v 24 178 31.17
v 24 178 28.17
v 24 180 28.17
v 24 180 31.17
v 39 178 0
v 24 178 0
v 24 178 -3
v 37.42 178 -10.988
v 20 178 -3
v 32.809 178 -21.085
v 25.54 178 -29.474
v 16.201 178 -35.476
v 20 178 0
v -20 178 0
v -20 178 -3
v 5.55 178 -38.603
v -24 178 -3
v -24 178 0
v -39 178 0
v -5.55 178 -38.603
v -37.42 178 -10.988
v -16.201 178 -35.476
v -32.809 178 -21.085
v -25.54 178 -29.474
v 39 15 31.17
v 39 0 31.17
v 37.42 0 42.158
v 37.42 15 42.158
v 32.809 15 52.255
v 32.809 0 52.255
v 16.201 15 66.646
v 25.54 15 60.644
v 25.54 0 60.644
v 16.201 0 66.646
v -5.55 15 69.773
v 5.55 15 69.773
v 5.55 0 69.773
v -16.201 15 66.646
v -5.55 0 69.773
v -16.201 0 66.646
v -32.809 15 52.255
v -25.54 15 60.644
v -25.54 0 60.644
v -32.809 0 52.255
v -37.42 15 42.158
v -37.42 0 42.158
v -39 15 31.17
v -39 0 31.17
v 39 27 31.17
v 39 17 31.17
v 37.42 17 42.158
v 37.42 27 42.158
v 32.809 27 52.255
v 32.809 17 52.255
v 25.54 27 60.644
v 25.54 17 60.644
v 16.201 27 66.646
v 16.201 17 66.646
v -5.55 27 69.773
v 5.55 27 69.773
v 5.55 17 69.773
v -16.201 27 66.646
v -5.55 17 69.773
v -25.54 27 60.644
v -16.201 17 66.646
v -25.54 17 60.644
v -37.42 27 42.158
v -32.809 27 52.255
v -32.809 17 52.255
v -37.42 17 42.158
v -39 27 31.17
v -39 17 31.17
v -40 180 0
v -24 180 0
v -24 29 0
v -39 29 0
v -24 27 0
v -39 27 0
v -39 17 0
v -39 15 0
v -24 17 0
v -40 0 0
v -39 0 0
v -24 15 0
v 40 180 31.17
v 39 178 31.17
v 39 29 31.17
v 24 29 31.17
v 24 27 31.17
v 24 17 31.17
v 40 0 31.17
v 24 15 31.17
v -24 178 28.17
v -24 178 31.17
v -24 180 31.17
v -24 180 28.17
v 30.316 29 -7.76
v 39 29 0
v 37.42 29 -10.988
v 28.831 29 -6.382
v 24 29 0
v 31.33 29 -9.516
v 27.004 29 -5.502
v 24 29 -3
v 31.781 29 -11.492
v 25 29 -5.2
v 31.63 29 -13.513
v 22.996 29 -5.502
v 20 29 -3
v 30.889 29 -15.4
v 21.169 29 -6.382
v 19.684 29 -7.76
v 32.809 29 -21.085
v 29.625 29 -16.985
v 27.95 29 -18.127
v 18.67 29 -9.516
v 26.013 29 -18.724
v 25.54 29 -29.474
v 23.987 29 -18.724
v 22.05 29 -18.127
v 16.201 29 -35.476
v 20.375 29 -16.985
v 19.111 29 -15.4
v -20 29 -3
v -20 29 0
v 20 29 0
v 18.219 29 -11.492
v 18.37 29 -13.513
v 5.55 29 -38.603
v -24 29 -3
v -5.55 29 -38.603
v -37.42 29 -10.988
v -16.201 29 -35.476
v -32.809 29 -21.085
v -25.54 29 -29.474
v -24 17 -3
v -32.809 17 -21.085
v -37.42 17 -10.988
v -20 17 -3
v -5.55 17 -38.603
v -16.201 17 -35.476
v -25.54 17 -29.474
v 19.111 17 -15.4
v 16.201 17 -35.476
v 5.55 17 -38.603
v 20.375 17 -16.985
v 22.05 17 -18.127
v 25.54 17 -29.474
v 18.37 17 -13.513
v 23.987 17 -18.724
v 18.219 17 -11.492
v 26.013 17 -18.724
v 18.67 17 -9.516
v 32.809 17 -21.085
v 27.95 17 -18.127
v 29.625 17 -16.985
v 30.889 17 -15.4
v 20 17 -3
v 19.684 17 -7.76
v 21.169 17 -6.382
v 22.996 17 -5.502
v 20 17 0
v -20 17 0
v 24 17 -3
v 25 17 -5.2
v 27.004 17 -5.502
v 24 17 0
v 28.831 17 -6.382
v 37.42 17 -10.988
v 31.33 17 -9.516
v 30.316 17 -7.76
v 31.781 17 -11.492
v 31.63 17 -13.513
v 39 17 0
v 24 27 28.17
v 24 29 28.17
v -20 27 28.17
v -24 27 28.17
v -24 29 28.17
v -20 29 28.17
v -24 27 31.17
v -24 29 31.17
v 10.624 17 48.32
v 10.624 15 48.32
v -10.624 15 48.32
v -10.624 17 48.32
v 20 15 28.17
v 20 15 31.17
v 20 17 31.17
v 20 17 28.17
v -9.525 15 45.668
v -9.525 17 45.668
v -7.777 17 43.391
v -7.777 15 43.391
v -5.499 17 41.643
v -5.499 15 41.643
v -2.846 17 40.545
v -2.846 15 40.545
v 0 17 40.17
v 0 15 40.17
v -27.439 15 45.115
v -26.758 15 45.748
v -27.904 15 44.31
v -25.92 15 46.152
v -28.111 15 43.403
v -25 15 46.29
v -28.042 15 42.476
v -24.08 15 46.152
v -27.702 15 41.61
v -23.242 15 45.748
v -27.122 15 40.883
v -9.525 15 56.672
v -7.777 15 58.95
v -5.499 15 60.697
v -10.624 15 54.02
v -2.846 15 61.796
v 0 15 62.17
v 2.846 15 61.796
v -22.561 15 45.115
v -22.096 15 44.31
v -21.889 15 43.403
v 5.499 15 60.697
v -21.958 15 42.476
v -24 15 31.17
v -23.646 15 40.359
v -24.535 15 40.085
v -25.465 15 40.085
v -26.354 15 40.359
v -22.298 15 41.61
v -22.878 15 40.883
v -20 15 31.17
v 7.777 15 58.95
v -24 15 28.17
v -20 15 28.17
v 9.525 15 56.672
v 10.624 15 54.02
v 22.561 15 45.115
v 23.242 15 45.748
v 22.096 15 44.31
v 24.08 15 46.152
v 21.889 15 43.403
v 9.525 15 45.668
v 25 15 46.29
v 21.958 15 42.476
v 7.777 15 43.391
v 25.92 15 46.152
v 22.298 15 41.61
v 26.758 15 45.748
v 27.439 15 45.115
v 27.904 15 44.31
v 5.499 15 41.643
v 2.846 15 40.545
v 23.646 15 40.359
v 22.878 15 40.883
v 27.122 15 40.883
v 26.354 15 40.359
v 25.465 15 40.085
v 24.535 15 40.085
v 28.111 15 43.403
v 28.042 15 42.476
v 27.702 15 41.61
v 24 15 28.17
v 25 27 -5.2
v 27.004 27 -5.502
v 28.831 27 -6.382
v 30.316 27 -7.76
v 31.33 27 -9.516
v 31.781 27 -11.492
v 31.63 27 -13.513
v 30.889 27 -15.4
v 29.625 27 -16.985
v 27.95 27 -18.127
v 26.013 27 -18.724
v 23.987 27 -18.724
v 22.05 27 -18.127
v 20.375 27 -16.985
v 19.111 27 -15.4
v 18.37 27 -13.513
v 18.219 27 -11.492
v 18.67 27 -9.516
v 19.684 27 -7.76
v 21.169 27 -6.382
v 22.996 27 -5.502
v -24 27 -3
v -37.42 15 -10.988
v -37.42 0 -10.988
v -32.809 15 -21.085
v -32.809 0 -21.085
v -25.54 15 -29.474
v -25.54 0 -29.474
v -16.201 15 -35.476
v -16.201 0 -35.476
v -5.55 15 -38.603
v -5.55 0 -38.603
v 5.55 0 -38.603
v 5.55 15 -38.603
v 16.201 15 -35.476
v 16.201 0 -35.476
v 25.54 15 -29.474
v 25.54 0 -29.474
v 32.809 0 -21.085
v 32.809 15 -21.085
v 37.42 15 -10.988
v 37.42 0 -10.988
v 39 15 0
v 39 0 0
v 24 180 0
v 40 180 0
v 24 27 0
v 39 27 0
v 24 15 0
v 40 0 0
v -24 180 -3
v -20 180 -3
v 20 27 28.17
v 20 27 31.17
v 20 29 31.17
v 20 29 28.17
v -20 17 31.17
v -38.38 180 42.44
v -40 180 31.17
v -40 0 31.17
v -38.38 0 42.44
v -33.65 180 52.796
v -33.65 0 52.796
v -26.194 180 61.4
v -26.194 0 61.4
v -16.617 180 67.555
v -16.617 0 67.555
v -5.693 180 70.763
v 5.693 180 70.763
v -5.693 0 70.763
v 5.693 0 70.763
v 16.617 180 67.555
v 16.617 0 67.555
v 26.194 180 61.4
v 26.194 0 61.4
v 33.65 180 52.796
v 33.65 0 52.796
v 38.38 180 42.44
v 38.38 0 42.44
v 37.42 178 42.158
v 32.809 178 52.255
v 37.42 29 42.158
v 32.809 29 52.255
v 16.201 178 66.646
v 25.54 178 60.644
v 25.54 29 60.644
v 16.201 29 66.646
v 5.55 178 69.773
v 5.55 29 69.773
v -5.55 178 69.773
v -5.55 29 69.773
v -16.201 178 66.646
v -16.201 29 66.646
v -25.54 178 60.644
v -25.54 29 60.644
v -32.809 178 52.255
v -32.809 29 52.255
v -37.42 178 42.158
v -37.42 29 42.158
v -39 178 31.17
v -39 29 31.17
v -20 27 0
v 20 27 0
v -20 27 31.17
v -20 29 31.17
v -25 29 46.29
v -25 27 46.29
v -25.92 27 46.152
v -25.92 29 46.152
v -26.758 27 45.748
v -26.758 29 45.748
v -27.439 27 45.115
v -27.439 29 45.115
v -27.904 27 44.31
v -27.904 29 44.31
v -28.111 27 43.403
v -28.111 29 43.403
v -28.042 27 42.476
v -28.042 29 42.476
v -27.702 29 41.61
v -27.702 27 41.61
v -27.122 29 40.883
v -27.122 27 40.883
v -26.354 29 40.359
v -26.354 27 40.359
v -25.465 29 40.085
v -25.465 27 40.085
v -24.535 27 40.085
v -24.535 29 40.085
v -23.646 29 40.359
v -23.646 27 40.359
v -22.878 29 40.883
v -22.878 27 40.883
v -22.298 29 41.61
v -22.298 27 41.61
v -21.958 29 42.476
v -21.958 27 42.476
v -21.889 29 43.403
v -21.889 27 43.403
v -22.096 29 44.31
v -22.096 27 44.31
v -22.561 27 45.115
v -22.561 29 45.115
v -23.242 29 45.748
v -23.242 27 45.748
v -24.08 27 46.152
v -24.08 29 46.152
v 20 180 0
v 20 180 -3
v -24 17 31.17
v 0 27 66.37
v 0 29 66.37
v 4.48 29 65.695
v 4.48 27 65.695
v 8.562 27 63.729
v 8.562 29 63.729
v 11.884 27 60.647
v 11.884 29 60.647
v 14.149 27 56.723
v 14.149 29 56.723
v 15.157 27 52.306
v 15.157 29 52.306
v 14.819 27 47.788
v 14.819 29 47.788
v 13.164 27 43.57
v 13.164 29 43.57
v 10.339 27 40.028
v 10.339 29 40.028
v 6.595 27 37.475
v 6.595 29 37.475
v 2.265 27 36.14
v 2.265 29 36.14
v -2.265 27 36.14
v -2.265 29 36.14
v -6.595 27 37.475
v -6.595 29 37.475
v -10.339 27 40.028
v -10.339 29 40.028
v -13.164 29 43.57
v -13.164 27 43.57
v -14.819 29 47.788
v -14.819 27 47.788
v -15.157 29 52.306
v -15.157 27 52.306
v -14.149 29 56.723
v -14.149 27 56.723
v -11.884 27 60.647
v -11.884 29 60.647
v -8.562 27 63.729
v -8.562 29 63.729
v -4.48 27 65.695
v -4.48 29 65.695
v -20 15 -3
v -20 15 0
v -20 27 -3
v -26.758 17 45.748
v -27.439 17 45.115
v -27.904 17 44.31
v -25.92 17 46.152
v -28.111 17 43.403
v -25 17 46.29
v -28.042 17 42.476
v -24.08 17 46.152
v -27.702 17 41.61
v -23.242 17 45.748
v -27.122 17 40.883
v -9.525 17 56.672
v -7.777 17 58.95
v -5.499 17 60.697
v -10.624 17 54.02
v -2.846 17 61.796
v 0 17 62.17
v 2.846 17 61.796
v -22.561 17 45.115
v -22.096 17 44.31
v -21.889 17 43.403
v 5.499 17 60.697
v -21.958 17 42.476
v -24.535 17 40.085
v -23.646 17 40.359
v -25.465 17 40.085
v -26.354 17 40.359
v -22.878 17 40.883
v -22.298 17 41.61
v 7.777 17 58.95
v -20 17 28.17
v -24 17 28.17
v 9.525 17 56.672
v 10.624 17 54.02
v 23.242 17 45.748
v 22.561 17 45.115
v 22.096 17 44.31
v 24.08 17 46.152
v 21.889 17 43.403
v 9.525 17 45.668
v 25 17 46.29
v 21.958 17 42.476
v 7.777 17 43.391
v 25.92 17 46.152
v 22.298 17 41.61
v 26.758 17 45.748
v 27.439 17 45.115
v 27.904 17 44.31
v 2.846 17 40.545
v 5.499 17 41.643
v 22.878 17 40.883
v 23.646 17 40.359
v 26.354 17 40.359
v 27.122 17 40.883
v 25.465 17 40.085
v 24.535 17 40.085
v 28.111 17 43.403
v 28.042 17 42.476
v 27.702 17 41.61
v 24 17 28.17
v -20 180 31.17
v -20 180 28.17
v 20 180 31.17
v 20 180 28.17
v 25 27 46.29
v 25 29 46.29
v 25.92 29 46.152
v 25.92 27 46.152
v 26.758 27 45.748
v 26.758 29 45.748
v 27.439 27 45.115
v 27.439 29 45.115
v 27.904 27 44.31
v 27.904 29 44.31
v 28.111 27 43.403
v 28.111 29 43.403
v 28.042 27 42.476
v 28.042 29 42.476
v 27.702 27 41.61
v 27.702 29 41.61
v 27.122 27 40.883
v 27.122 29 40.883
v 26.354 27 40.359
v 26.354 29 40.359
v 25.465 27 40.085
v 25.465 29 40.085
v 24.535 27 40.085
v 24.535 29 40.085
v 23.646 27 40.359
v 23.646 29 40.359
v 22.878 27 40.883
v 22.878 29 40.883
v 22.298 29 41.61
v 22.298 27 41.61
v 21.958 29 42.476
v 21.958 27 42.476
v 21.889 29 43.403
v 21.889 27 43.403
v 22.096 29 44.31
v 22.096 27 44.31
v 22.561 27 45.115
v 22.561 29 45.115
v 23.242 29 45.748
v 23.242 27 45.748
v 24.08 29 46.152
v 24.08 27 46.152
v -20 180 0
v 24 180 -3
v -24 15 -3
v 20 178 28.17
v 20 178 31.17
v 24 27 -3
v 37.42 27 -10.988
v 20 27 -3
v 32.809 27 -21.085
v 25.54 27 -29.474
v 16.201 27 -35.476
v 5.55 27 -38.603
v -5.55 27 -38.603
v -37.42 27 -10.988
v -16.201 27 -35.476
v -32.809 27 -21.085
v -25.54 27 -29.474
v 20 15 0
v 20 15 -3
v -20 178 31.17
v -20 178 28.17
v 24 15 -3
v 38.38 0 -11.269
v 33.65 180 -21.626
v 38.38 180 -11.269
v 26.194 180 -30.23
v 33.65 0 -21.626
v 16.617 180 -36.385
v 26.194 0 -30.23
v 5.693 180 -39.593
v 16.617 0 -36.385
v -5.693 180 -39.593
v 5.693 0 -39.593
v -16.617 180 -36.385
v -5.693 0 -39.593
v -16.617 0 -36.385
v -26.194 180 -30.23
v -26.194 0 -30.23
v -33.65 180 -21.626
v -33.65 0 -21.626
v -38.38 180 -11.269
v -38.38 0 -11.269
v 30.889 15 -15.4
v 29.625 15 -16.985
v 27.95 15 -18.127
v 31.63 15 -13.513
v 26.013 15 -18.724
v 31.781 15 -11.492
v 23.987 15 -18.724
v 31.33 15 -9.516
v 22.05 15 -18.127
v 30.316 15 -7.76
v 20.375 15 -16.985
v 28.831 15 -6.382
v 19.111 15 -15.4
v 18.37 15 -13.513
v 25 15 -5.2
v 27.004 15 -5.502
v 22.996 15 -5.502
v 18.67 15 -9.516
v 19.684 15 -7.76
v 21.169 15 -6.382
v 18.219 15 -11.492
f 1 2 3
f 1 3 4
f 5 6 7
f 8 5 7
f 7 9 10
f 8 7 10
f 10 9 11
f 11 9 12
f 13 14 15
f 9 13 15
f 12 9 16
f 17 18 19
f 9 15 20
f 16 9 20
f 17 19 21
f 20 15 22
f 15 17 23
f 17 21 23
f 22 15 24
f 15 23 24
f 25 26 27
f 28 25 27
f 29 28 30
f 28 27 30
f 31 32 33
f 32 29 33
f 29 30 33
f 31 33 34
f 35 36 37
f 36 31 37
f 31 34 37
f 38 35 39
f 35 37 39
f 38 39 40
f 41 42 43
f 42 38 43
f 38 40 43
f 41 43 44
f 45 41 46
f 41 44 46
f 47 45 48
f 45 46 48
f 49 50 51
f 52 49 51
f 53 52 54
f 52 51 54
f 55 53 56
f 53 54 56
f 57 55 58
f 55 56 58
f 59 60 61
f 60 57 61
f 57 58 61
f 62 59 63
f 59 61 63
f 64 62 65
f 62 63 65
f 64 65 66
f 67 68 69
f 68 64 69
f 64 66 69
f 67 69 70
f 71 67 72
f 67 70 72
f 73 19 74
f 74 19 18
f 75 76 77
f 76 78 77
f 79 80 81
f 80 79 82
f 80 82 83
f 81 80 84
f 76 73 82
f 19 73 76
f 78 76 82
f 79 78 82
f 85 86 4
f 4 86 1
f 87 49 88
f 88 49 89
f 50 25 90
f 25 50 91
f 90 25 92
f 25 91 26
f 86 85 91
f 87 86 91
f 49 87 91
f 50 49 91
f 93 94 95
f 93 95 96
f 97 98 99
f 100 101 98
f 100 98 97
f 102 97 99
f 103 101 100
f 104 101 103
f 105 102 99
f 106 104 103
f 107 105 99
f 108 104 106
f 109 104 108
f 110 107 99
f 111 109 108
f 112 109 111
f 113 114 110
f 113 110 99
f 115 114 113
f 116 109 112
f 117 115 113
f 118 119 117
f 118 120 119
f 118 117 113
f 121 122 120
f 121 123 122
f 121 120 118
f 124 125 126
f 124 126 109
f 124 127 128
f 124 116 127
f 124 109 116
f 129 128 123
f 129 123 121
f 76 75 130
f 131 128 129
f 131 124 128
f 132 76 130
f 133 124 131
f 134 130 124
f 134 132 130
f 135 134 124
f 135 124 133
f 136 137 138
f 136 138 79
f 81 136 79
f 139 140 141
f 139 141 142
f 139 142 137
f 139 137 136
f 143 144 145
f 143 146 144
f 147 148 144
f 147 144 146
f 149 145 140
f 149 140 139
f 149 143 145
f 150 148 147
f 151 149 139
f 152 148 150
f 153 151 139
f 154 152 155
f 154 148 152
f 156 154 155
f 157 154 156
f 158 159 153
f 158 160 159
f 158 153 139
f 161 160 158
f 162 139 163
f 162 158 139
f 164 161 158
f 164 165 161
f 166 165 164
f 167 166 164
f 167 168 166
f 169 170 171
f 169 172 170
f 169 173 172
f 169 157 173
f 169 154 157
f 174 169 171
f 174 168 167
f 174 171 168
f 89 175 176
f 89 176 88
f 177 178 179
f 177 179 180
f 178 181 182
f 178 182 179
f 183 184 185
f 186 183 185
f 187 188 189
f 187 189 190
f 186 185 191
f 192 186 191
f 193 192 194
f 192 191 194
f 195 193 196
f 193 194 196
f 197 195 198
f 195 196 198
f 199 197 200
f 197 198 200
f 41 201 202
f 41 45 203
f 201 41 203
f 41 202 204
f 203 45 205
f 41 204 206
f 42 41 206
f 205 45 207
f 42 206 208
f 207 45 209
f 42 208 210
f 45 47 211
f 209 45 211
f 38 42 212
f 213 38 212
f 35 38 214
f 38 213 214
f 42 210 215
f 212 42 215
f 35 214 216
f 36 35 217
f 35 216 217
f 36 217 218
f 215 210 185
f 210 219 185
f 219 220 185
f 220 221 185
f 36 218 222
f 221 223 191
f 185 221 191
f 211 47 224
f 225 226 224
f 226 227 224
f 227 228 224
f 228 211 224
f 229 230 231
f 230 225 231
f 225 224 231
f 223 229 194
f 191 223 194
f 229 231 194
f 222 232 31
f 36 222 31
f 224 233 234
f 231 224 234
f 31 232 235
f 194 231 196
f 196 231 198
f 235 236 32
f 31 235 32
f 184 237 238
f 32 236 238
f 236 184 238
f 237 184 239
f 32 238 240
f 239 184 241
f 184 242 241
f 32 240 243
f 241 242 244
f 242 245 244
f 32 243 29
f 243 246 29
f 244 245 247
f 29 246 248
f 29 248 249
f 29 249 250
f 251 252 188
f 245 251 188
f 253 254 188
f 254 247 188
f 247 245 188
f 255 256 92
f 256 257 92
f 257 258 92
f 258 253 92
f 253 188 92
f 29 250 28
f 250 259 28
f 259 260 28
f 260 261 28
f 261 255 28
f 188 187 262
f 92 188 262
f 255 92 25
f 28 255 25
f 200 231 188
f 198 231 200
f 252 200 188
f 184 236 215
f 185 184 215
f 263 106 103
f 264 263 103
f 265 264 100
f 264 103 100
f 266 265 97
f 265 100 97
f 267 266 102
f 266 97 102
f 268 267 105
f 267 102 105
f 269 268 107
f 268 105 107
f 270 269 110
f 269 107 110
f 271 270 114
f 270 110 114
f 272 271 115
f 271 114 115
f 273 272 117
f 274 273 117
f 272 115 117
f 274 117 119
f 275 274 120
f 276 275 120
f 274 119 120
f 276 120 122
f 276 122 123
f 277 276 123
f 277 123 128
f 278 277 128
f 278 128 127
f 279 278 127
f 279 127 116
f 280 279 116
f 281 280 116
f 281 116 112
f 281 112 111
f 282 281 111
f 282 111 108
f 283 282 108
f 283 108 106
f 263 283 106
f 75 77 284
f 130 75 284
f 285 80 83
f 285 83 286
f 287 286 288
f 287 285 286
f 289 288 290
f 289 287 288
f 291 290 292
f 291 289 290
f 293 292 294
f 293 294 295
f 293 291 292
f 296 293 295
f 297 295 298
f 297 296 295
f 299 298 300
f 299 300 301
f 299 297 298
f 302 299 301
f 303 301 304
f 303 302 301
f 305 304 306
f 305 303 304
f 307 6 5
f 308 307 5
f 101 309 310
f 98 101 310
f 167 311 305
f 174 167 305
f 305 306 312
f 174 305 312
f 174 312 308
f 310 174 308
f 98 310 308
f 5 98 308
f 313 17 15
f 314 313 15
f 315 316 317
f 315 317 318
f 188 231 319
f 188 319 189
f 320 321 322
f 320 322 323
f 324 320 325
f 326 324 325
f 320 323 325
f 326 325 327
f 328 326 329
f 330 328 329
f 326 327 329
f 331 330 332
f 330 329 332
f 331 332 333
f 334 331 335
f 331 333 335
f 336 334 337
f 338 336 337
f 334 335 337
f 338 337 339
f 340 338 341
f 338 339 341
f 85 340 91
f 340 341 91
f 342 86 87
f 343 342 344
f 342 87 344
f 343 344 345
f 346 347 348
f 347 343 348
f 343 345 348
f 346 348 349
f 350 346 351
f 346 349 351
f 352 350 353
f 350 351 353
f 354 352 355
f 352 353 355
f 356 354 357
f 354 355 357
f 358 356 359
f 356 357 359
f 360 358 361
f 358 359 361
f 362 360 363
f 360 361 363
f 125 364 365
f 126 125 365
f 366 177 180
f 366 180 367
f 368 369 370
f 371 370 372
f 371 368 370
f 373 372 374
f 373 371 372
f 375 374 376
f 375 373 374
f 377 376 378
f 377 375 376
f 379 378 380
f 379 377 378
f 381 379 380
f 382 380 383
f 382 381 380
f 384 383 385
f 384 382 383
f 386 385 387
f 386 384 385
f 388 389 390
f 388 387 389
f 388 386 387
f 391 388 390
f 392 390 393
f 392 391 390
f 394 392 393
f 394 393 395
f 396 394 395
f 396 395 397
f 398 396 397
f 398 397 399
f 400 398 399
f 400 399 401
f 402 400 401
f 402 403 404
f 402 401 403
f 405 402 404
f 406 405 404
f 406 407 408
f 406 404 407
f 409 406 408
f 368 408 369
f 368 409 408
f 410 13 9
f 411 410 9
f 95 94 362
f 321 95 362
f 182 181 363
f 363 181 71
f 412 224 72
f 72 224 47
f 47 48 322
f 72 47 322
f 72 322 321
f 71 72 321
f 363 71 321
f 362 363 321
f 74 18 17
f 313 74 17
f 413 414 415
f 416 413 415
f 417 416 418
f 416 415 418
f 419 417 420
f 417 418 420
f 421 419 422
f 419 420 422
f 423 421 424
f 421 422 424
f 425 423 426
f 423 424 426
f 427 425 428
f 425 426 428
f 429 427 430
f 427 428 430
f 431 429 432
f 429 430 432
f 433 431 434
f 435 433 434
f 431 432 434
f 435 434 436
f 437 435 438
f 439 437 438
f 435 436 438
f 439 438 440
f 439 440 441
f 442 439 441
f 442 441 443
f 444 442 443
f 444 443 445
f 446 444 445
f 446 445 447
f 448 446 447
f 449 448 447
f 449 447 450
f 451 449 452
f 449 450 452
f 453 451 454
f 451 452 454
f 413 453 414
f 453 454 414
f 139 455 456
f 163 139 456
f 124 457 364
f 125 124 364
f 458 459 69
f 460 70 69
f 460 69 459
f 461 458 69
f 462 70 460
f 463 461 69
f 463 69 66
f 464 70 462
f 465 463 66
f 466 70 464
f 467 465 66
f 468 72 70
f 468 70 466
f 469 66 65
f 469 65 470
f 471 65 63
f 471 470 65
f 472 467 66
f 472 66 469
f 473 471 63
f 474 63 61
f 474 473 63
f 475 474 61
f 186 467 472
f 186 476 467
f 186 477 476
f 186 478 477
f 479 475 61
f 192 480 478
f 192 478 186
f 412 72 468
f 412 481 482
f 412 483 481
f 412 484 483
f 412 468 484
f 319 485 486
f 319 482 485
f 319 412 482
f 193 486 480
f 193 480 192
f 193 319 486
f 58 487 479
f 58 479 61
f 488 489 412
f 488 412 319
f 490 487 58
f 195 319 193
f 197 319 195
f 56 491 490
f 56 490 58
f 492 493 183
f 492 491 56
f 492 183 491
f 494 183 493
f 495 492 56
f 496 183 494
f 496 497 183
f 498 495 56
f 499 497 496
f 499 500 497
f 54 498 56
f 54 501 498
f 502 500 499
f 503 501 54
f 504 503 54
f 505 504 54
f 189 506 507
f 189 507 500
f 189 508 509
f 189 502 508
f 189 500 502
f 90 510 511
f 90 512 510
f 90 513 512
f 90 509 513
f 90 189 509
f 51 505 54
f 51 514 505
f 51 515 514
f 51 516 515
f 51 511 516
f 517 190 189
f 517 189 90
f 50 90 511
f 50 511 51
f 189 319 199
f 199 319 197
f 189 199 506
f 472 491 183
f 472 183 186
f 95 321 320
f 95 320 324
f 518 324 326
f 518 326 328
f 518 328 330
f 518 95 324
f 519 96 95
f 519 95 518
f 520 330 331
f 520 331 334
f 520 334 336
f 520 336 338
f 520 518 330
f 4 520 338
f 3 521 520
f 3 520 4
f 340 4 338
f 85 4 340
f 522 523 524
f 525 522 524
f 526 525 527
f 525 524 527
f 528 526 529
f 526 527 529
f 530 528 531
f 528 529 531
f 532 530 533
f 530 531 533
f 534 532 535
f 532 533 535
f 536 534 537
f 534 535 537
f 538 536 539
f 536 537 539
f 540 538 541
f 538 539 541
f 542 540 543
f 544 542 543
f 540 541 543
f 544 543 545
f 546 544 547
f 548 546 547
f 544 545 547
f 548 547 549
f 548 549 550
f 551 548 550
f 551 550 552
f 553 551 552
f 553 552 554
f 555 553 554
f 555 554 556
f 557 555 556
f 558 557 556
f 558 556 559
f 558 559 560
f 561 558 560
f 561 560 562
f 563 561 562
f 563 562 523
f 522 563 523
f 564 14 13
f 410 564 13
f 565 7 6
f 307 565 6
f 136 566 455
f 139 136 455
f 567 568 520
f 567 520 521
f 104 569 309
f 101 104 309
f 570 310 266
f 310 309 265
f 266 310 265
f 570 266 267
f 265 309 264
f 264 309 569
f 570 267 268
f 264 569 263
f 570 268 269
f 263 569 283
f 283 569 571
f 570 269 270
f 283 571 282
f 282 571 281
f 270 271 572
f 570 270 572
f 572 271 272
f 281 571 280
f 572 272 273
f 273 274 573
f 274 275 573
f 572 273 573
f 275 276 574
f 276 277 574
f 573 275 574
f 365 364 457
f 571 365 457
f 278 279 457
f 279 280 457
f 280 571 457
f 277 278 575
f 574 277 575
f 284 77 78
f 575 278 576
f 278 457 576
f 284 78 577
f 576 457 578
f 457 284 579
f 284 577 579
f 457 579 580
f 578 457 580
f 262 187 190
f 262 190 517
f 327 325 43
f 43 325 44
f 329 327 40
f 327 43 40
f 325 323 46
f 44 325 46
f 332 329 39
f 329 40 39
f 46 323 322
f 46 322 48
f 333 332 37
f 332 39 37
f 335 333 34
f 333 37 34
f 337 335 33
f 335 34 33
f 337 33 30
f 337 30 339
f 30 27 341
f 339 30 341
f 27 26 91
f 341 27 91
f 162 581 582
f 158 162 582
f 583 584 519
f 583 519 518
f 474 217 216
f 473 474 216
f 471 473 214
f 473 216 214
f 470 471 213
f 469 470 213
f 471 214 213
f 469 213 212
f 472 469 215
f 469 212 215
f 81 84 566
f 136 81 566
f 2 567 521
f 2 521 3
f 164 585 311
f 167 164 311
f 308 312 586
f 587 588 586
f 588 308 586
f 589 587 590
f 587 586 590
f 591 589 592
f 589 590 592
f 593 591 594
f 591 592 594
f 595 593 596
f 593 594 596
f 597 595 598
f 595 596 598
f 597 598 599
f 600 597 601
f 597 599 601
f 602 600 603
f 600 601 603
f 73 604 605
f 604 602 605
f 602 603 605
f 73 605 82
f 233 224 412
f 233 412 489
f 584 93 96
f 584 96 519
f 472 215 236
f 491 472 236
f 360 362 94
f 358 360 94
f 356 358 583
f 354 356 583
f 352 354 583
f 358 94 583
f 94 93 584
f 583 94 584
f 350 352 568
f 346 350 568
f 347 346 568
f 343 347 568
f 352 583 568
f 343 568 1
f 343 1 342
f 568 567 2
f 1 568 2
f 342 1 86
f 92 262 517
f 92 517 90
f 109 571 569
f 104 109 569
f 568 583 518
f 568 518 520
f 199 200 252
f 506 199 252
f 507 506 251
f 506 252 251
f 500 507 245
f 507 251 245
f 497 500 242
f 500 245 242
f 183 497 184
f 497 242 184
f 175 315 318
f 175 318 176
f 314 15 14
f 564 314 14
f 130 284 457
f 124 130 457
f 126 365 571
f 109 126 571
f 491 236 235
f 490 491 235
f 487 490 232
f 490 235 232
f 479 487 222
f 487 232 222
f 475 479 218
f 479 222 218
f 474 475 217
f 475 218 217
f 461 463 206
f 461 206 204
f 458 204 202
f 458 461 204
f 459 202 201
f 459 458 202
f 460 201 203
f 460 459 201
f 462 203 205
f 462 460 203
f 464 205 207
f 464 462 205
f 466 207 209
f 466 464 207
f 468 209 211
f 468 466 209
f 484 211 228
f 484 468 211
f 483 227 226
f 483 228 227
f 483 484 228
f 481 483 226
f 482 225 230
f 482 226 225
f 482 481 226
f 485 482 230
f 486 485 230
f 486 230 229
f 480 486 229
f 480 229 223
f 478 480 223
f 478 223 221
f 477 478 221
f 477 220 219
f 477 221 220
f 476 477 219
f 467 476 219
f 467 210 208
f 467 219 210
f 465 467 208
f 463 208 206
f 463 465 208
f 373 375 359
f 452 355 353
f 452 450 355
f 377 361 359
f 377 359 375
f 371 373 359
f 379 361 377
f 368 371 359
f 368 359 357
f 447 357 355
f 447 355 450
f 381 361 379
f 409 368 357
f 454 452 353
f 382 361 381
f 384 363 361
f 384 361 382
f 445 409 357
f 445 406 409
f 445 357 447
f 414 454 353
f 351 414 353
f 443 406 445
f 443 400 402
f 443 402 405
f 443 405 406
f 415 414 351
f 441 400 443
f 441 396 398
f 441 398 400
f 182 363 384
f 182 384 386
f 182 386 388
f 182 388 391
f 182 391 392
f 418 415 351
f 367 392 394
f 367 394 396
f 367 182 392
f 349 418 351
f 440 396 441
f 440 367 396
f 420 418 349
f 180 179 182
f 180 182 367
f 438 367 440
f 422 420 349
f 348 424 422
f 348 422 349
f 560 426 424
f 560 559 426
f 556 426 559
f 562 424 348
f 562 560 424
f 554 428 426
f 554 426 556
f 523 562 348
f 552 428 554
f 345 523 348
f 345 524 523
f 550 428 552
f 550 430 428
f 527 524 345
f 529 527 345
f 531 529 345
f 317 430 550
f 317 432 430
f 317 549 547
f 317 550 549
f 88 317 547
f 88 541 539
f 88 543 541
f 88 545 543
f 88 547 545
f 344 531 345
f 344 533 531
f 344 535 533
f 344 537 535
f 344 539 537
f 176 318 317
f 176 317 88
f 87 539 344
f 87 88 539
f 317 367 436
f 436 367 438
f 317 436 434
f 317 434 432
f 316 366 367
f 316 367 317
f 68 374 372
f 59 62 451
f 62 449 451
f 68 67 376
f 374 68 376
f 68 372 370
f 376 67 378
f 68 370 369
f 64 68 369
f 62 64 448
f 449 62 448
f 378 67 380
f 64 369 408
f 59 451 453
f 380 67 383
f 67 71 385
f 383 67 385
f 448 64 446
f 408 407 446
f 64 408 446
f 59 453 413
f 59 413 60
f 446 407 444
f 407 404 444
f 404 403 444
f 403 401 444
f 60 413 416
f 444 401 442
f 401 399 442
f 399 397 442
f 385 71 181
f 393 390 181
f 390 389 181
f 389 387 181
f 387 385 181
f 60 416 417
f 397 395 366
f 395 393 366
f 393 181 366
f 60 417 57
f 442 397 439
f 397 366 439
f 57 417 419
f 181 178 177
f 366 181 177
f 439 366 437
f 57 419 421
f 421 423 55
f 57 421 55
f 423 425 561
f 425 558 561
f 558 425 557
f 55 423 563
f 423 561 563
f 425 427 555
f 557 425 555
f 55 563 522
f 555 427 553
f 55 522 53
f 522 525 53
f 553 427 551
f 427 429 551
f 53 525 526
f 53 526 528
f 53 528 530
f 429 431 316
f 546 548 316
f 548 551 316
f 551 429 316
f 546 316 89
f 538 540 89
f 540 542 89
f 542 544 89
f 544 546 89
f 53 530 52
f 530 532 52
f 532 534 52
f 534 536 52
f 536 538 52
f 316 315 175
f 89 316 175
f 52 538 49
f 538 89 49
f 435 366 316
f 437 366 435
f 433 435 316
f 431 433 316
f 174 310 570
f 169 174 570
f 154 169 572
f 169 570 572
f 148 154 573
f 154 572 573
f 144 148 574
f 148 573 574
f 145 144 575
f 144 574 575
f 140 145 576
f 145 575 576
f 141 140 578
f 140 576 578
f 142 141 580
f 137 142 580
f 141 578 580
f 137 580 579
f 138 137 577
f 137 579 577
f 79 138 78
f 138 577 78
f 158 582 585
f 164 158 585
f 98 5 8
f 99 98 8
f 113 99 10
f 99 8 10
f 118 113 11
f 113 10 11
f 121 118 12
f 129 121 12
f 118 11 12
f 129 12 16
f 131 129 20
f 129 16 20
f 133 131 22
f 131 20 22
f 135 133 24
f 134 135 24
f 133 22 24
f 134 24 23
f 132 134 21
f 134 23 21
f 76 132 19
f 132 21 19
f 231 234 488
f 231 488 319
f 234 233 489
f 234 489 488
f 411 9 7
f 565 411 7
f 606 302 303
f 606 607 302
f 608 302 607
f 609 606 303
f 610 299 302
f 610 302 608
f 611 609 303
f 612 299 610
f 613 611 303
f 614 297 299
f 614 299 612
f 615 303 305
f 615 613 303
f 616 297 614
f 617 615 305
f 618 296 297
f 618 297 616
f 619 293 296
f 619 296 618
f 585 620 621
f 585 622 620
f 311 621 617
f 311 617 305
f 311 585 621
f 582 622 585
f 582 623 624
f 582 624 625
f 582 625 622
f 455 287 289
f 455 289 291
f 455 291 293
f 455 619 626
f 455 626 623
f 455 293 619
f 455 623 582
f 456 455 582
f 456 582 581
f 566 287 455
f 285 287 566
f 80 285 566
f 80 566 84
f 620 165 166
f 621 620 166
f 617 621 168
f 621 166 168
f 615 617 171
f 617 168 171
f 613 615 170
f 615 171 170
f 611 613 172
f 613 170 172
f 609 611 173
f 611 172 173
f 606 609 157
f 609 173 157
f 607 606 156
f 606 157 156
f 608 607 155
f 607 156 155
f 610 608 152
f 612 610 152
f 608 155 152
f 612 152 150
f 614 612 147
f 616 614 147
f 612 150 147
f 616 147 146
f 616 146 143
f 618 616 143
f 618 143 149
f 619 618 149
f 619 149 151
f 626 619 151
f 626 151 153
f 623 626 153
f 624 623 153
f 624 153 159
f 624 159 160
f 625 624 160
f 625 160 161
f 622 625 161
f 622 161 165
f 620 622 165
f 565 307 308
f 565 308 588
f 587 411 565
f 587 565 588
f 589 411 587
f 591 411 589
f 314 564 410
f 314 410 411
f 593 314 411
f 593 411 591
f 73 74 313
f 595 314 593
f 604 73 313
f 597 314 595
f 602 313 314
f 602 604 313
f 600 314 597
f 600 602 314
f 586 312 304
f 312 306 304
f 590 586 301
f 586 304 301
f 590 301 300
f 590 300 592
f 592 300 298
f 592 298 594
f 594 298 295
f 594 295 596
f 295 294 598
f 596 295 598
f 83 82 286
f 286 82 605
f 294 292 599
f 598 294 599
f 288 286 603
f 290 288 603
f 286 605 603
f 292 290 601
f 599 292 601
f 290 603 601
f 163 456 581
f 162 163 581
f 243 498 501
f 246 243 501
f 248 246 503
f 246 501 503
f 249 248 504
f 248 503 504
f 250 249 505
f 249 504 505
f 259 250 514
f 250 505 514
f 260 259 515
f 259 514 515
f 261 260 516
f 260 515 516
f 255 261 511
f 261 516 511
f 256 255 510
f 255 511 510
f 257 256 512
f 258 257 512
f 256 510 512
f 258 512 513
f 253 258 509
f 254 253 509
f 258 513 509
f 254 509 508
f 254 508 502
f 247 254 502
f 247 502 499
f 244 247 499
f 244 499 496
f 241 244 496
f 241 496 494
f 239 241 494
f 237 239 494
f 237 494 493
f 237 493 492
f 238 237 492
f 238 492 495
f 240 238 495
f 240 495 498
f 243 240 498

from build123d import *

# Parameters (mm, degrees)
SKETCH1_R               = 40
BOSS_EXTRUDE1_DEPTH     = 180
SKETCH3_R               = 39
CUT_EXTRUDE1_DEPTH      = 163
CUT_EXTRUDE2_START      = -15
SKETCH5_R               = 39
CUT_EXTRUDE2_DEPTH      = 15
SKETCH6_R               = 40
BOSS_EXTRUDE2_DEPTH     = 2
BOSS_EXTRUDE3_START     = -2
SKETCH7_R               = 40
BOSS_EXTRUDE3_DEPTH     = 2
SPLIT1_SURFACE_1_BACK   = 213.603
SPLIT1_SURFACE_1_DEPTH  = 427.206
SPLIT1_SURFACE_2_BACK   = 213.603
SPLIT1_SURFACE_2_DEPTH  = 427.206
BODY_MOVE_COPY1_DEPTH   = 180
BODY_MOVE_COPY1_START   = 29
BODY_MOVE_COPY1_2_DEPTH = 149
BODY_MOVE_COPY1_3_DEPTH = 15
BODY_MOVE_COPY1_START_2 = 17
BODY_MOVE_COPY1_4_DEPTH = 10
BODY_MOVE_COPY1_5_DEPTH = 180
BODY_MOVE_COPY1_START_3 = 15
BODY_MOVE_COPY1_6_DEPTH = 2
BODY_MOVE_COPY1_START_4 = 27
BODY_MOVE_COPY1_7_DEPTH = 2
BODY_MOVE_COPY1_START_5 = 178
BODY_MOVE_COPY1_8_DEPTH = 2
SKETCH9_R               = 15.2
CUT_EXTRUDE3_DEPTH      = 2
CUT_EXTRUDE4_DEPTH      = 2
SKETCH11_R              = 3.12
CUT_EXTRUDE5_DEPTH      = 172.657213337
SKETCH14_R              = 6.8
CUT_EXTRUDE6_DEPTH      = 172.657213337


# Read off the part's stored shape, not the designer's step: Body-Move/Copy1
with BuildPart() as part:
    # Sketch1 → Boss-Extrude1 (new body)
    with BuildSketch(Plane(origin=(0, 0, 0), x_dir=(1, 0, 0), z_dir=(0, 1, 0))):
        with Locations(Location((0, 0, 0), (0, 0, 90))):
            Circle(SKETCH1_R)
    extrude(amount=BOSS_EXTRUDE1_DEPTH)

    # Sketch3 → Cut-Extrude1 (cut)
    with BuildSketch(Plane(origin=(0, 180, 0), x_dir=(1, 0, 0), z_dir=(0, 1, 0))):
        with Locations(Location((0, 0, 0), (0, 0, 270))):
            Circle(SKETCH3_R)
    extrude(amount=-CUT_EXTRUDE1_DEPTH, mode=Mode.SUBTRACT)

    # Sketch5 → Cut-Extrude2 (cut)
    with BuildSketch(Plane.XZ.offset(CUT_EXTRUDE2_START)):
        with Locations(Location((0, 0, 0), (0, 0, 90))):
            Circle(SKETCH5_R)
    extrude(amount=CUT_EXTRUDE2_DEPTH, mode=Mode.SUBTRACT)

    # Sketch6 → Boss-Extrude2 (add)
    with BuildSketch(Plane(origin=(0, 27, 0), x_dir=(1, 0, 0), z_dir=(0, 1, 0))):
        with Locations(Location((0, 0, 0), (0, 0, 90))):
            Circle(SKETCH6_R)
    extrude(amount=BOSS_EXTRUDE2_DEPTH)

    # Sketch7 → Boss-Extrude3 (add)
    with BuildSketch(Plane(origin=(0, 180, 0), x_dir=(1, 0, 0), z_dir=(0, 1, 0)).offset(BOSS_EXTRUDE3_START)):
        with Locations(Location((0, 0, 0), (0, 0, 90))):
            Circle(SKETCH7_R)
    extrude(amount=BOSS_EXTRUDE3_DEPTH)


with BuildPart() as body_2:
    # Split1: the piece behind the surface
    add(part.part)
    # Split1 surface: a surface, the sketch's curves swept straight by 427.206 mm
    with BuildLine(Plane(origin=(0, 180, 0), x_dir=(1, 0, 0), z_dir=(0, 1, 0)).offset(-SPLIT1_SURFACE_1_BACK), mode=Mode.PRIVATE) as split1_surface_1_path:
        Line((-40, 0), (-24, 0))
        Line((-24, 0), (-24, 3))
        Line((-24, 3), (-20, 3))
        Line((-20, 3), (-20, 0))
        Line((-20, 0), (20, 0))
        Line((20, 0), (20, 3))
        Line((20, 3), (24, 3))
        Line((24, 3), (24, 0))
        Line((24, 0), (40, 0))
    split1_surface_1 = Shell.extrude(split1_surface_1_path.wire(), (0 * SPLIT1_SURFACE_1_DEPTH, 1 * SPLIT1_SURFACE_1_DEPTH, 0 * SPLIT1_SURFACE_1_DEPTH))
    split(bisect_by=split1_surface_1, keep=Keep.BOTTOM)

    # Body-Move/Copy1 outline → Body-Move/Copy1 (cut)
    with BuildSketch(Plane(origin=(0, 0, 0), x_dir=(1, 0, 0), z_dir=(0, 1, 0))):
        with BuildLine():
            Line((20, -28.170210697), (24, -28.170210697))
            Line((24, -28.170210697), (24, -31.170210697))
            Line((24, -31.170210697), (25.068266097, -31.170210697))
            ThreePointArc((25.068266097, -31.170210697), (36.074441395, -17.281049681), (40, 0))
            Line((40, 0), (24, 0))
            Line((24, 0), (24, 3))
            Line((24, 3), (20, 3))
            Line((20, 3), (20, 0))
            Line((20, 0), (-20, 0))
            Line((-20, 0), (-20, 3))
            Line((-20, 3), (-24, 3))
            Line((-24, 3), (-24, 0))
            Line((-24, 0), (-40, 0))
            ThreePointArc((-40, 0), (-36.074441395, -17.281049681), (-25.068266097, -31.170210697))
            Line((-25.068266097, -31.170210697), (-24, -31.170210697))
            Line((-24, -31.170210697), (-24, -28.170210697))
            Line((-24, -28.170210697), (-20, -28.170210697))
            Line((-20, -28.170210697), (-20, -31.170210697))
            Line((-20, -31.170210697), (20, -31.170210697))
            Line((20, -31.170210697), (20, -28.170210697))
        make_face()
    extrude(amount=BODY_MOVE_COPY1_DEPTH, mode=Mode.SUBTRACT)

    # Body-Move_Copy1 2 outline → Body-Move_Copy1 2 (cut)
    with BuildSketch(Plane(origin=(0, 0, 0), x_dir=(1, 0, 0), z_dir=(0, 1, 0)).offset(BODY_MOVE_COPY1_START)):
        with BuildLine():
            Line((24, -31.170210697), (24, -30.740852298))
            ThreePointArc((24, -30.740852298), (0, -39), (-24, -30.740852298))
            Line((-24, -30.740852298), (-24, -31.170210697))
            Line((-24, -31.170210697), (-25.068266097, -31.170210697))
            ThreePointArc((-25.068266097, -31.170210697), (0, -40), (25.068266097, -31.170210697))
            Line((25.068266097, -31.170210697), (24, -31.170210697))
        make_face()
    extrude(amount=BODY_MOVE_COPY1_2_DEPTH, mode=Mode.SUBTRACT)

    # Body-Move_Copy1 3 outline → Body-Move_Copy1 3 (cut)
    with BuildSketch(Plane(origin=(0, 0, 0), x_dir=(1, 0, 0), z_dir=(0, 1, 0))):
        with BuildLine():
            Line((24, -31.170210697), (24, -30.740852298))
            ThreePointArc((24, -30.740852298), (0, -39), (-24, -30.740852298))
            Line((-24, -30.740852298), (-24, -31.170210697))
            Line((-24, -31.170210697), (-25.068266097, -31.170210697))
            ThreePointArc((-25.068266097, -31.170210697), (0, -40), (25.068266097, -31.170210697))
            Line((25.068266097, -31.170210697), (24, -31.170210697))
        make_face()
    extrude(amount=BODY_MOVE_COPY1_3_DEPTH, mode=Mode.SUBTRACT)

    # Body-Move_Copy1 4 outline → Body-Move_Copy1 4 (cut)
    with BuildSketch(Plane(origin=(0, 0, 0), x_dir=(1, 0, 0), z_dir=(0, 1, 0)).offset(BODY_MOVE_COPY1_START_2)):
        with BuildLine():
            Line((24, -31.170210697), (24, -30.740852298))
            ThreePointArc((24, -30.740852298), (0, -39), (-24, -30.740852298))
            Line((-24, -30.740852298), (-24, -31.170210697))
            Line((-24, -31.170210697), (-25.068266097, -31.170210697))
            ThreePointArc((-25.068266097, -31.170210697), (0, -40), (25.068266097, -31.170210697))
            Line((25.068266097, -31.170210697), (24, -31.170210697))
        make_face()
    extrude(amount=BODY_MOVE_COPY1_4_DEPTH, mode=Mode.SUBTRACT)



with BuildPart() as part_1:
    add(part.part)

    # Split1: split by a surface, the side it looks to stays
    # Split1 surface: a surface, the sketch's curves swept straight by 427.206 mm
    with BuildLine(Plane(origin=(0, 180, 0), x_dir=(1, 0, 0), z_dir=(0, 1, 0)).offset(-SPLIT1_SURFACE_2_BACK), mode=Mode.PRIVATE) as split1_surface_2_path:
        Line((-40, 0), (-24, 0))
        Line((-24, 0), (-24, 3))
        Line((-24, 3), (-20, 3))
        Line((-20, 3), (-20, 0))
        Line((-20, 0), (20, 0))
        Line((20, 0), (20, 3))
        Line((20, 3), (24, 3))
        Line((24, 3), (24, 0))
        Line((24, 0), (40, 0))
    split1_surface_2 = Shell.extrude(split1_surface_2_path.wire(), (0 * SPLIT1_SURFACE_2_DEPTH, 1 * SPLIT1_SURFACE_2_DEPTH, 0 * SPLIT1_SURFACE_2_DEPTH))
    split(bisect_by=split1_surface_2, keep=Keep.TOP)

    # Sketch14 → Cut-Extrude6 (cut, through all)
    with BuildSketch(Plane(origin=(0, 29, 0), x_dir=(1, 0, 0), z_dir=(0, 1, 0))):
        with Locations(Location((25, 12, 0), (0, 0, 270))):
            Circle(SKETCH14_R)
    extrude(amount=-CUT_EXTRUDE6_DEPTH, mode=Mode.SUBTRACT)


with BuildPart() as body_3:
    # Body-Move_Copy1 5 outline → Body-Move_Copy1 5 (new body)
    with BuildSketch(Plane(origin=(0, 0, 0), x_dir=(1, 0, 0), z_dir=(0, 1, 0))):
        with BuildLine():
            Line((40, -31.170210697), (39, -31.170210697))
            ThreePointArc((39, -31.170210697), (0, -70.170210697), (-39, -31.170210697))
            Line((-39, -31.170210697), (-40, -31.170210697))
            ThreePointArc((-40, -31.170210697), (0, -71.170210697), (40, -31.170210697))
        make_face()
    extrude(amount=BODY_MOVE_COPY1_5_DEPTH)


with BuildPart() as body_2_1:
    add(body_2.part)

    add(body_3.part)  # Body-Move_Copy1 6 merges body 3
    # Body-Move_Copy1 6 outline → Body-Move_Copy1 6 (add)
    with BuildSketch(Plane(origin=(0, 0, 0), x_dir=(1, 0, 0), z_dir=(0, 1, 0)).offset(BODY_MOVE_COPY1_START_3)):
        with BuildLine():
            Line((39, -31.170210697), (25.068266097, -31.170210697))
            ThreePointArc((25.068266097, -31.170210697), (0, -40), (-25.068266097, -31.170210697))
            Line((-25.068266097, -31.170210697), (-39, -31.170210697))
            ThreePointArc((-39, -31.170210697), (0, -70.170210697), (39, -31.170210697))
        make_face()
    extrude(amount=BODY_MOVE_COPY1_6_DEPTH)

    # Body-Move_Copy1 7 outline → Body-Move_Copy1 7 (add)
    with BuildSketch(Plane(origin=(0, 0, 0), x_dir=(1, 0, 0), z_dir=(0, 1, 0)).offset(BODY_MOVE_COPY1_START_4)):
        with BuildLine():
            Line((39, -31.170210697), (25.068266097, -31.170210697))
            ThreePointArc((25.068266097, -31.170210697), (0, -40), (-25.068266097, -31.170210697))
            Line((-25.068266097, -31.170210697), (-39, -31.170210697))
            ThreePointArc((-39, -31.170210697), (0, -70.170210697), (39, -31.170210697))
        make_face()
    extrude(amount=BODY_MOVE_COPY1_7_DEPTH)

    # Body-Move_Copy1 8 outline → Body-Move_Copy1 8 (add)
    with BuildSketch(Plane(origin=(0, 0, 0), x_dir=(1, 0, 0), z_dir=(0, 1, 0)).offset(BODY_MOVE_COPY1_START_5)):
        with BuildLine():
            Line((39, -31.170210697), (25.068266097, -31.170210697))
            ThreePointArc((25.068266097, -31.170210697), (0, -40), (-25.068266097, -31.170210697))
            Line((-25.068266097, -31.170210697), (-39, -31.170210697))
            ThreePointArc((-39, -31.170210697), (0, -70.170210697), (39, -31.170210697))
        make_face()
    extrude(amount=BODY_MOVE_COPY1_8_DEPTH)

    # Sketch9 → Cut-Extrude3 (cut)
    with BuildSketch(Plane(origin=(0, 29, 0), x_dir=(1, 0, 0), z_dir=(0, 1, 0))):
        with Locations(Location((0, -51.170210697, 0), (0, 0, 270))):
            Circle(SKETCH9_R)
    extrude(amount=-CUT_EXTRUDE3_DEPTH, mode=Mode.SUBTRACT)

    # Sketch10 → Cut-Extrude4 (cut)
    with BuildSketch(Plane.XZ.offset(-15)):
        with BuildLine():
            Line((-10.624382335, 54.020210697), (0, 54.020210697))
            Line((0, 54.020210697), (0, 62.170210697))
            ThreePointArc((0, 62.170210697), (-6.695147497, 59.898039752), (-10.624382335, 54.020210697))
        make_face()
        with BuildLine():
            Line((0, 62.170210697), (0, 54.020210697))
            Line((0, 54.020210697), (10.624382335, 54.020210697))
            ThreePointArc((10.624382335, 54.020210697), (6.695147497, 59.898039752), (0, 62.170210697))
        make_face()
        with BuildLine():
            ThreePointArc((-10.624382335, 48.320210697), (-6.695147497, 42.442381643), (0, 40.170210697))
            Line((0, 40.170210697), (0, 48.320210697))
            Line((0, 48.320210697), (-10.624382335, 48.320210697))
        make_face()
        with BuildLine():
            Line((0, 48.320210697), (0, 40.170210697))
            ThreePointArc((0, 40.170210697), (6.695147497, 42.442381643), (10.624382335, 48.320210697))
            Line((10.624382335, 48.320210697), (0, 48.320210697))
        make_face()
    extrude(amount=-CUT_EXTRUDE4_DEPTH, mode=Mode.SUBTRACT)

    # Sketch11 → Cut-Extrude5 (cut, through all)
    with BuildSketch(Plane(origin=(0, 29, 0), x_dir=(1, 0, 0), z_dir=(0, 1, 0))):
        with Locations(Location((25, -43.170210697, 0), (0, 0, 270))):
            Circle(SKETCH11_R)
    cut_extrude5 = extrude(amount=-CUT_EXTRUDE5_DEPTH, mode=Mode.SUBTRACT)

    # Mirror1: Cut-Extrude5 across plane
    add(cut_extrude5.mirror(Plane(origin=(0, 0, 0), x_dir=(0, 0, 1), z_dir=(1, 0, 0))), mode=Mode.SUBTRACT)


solid = Compound([part_1.part, body_2_1.part])
